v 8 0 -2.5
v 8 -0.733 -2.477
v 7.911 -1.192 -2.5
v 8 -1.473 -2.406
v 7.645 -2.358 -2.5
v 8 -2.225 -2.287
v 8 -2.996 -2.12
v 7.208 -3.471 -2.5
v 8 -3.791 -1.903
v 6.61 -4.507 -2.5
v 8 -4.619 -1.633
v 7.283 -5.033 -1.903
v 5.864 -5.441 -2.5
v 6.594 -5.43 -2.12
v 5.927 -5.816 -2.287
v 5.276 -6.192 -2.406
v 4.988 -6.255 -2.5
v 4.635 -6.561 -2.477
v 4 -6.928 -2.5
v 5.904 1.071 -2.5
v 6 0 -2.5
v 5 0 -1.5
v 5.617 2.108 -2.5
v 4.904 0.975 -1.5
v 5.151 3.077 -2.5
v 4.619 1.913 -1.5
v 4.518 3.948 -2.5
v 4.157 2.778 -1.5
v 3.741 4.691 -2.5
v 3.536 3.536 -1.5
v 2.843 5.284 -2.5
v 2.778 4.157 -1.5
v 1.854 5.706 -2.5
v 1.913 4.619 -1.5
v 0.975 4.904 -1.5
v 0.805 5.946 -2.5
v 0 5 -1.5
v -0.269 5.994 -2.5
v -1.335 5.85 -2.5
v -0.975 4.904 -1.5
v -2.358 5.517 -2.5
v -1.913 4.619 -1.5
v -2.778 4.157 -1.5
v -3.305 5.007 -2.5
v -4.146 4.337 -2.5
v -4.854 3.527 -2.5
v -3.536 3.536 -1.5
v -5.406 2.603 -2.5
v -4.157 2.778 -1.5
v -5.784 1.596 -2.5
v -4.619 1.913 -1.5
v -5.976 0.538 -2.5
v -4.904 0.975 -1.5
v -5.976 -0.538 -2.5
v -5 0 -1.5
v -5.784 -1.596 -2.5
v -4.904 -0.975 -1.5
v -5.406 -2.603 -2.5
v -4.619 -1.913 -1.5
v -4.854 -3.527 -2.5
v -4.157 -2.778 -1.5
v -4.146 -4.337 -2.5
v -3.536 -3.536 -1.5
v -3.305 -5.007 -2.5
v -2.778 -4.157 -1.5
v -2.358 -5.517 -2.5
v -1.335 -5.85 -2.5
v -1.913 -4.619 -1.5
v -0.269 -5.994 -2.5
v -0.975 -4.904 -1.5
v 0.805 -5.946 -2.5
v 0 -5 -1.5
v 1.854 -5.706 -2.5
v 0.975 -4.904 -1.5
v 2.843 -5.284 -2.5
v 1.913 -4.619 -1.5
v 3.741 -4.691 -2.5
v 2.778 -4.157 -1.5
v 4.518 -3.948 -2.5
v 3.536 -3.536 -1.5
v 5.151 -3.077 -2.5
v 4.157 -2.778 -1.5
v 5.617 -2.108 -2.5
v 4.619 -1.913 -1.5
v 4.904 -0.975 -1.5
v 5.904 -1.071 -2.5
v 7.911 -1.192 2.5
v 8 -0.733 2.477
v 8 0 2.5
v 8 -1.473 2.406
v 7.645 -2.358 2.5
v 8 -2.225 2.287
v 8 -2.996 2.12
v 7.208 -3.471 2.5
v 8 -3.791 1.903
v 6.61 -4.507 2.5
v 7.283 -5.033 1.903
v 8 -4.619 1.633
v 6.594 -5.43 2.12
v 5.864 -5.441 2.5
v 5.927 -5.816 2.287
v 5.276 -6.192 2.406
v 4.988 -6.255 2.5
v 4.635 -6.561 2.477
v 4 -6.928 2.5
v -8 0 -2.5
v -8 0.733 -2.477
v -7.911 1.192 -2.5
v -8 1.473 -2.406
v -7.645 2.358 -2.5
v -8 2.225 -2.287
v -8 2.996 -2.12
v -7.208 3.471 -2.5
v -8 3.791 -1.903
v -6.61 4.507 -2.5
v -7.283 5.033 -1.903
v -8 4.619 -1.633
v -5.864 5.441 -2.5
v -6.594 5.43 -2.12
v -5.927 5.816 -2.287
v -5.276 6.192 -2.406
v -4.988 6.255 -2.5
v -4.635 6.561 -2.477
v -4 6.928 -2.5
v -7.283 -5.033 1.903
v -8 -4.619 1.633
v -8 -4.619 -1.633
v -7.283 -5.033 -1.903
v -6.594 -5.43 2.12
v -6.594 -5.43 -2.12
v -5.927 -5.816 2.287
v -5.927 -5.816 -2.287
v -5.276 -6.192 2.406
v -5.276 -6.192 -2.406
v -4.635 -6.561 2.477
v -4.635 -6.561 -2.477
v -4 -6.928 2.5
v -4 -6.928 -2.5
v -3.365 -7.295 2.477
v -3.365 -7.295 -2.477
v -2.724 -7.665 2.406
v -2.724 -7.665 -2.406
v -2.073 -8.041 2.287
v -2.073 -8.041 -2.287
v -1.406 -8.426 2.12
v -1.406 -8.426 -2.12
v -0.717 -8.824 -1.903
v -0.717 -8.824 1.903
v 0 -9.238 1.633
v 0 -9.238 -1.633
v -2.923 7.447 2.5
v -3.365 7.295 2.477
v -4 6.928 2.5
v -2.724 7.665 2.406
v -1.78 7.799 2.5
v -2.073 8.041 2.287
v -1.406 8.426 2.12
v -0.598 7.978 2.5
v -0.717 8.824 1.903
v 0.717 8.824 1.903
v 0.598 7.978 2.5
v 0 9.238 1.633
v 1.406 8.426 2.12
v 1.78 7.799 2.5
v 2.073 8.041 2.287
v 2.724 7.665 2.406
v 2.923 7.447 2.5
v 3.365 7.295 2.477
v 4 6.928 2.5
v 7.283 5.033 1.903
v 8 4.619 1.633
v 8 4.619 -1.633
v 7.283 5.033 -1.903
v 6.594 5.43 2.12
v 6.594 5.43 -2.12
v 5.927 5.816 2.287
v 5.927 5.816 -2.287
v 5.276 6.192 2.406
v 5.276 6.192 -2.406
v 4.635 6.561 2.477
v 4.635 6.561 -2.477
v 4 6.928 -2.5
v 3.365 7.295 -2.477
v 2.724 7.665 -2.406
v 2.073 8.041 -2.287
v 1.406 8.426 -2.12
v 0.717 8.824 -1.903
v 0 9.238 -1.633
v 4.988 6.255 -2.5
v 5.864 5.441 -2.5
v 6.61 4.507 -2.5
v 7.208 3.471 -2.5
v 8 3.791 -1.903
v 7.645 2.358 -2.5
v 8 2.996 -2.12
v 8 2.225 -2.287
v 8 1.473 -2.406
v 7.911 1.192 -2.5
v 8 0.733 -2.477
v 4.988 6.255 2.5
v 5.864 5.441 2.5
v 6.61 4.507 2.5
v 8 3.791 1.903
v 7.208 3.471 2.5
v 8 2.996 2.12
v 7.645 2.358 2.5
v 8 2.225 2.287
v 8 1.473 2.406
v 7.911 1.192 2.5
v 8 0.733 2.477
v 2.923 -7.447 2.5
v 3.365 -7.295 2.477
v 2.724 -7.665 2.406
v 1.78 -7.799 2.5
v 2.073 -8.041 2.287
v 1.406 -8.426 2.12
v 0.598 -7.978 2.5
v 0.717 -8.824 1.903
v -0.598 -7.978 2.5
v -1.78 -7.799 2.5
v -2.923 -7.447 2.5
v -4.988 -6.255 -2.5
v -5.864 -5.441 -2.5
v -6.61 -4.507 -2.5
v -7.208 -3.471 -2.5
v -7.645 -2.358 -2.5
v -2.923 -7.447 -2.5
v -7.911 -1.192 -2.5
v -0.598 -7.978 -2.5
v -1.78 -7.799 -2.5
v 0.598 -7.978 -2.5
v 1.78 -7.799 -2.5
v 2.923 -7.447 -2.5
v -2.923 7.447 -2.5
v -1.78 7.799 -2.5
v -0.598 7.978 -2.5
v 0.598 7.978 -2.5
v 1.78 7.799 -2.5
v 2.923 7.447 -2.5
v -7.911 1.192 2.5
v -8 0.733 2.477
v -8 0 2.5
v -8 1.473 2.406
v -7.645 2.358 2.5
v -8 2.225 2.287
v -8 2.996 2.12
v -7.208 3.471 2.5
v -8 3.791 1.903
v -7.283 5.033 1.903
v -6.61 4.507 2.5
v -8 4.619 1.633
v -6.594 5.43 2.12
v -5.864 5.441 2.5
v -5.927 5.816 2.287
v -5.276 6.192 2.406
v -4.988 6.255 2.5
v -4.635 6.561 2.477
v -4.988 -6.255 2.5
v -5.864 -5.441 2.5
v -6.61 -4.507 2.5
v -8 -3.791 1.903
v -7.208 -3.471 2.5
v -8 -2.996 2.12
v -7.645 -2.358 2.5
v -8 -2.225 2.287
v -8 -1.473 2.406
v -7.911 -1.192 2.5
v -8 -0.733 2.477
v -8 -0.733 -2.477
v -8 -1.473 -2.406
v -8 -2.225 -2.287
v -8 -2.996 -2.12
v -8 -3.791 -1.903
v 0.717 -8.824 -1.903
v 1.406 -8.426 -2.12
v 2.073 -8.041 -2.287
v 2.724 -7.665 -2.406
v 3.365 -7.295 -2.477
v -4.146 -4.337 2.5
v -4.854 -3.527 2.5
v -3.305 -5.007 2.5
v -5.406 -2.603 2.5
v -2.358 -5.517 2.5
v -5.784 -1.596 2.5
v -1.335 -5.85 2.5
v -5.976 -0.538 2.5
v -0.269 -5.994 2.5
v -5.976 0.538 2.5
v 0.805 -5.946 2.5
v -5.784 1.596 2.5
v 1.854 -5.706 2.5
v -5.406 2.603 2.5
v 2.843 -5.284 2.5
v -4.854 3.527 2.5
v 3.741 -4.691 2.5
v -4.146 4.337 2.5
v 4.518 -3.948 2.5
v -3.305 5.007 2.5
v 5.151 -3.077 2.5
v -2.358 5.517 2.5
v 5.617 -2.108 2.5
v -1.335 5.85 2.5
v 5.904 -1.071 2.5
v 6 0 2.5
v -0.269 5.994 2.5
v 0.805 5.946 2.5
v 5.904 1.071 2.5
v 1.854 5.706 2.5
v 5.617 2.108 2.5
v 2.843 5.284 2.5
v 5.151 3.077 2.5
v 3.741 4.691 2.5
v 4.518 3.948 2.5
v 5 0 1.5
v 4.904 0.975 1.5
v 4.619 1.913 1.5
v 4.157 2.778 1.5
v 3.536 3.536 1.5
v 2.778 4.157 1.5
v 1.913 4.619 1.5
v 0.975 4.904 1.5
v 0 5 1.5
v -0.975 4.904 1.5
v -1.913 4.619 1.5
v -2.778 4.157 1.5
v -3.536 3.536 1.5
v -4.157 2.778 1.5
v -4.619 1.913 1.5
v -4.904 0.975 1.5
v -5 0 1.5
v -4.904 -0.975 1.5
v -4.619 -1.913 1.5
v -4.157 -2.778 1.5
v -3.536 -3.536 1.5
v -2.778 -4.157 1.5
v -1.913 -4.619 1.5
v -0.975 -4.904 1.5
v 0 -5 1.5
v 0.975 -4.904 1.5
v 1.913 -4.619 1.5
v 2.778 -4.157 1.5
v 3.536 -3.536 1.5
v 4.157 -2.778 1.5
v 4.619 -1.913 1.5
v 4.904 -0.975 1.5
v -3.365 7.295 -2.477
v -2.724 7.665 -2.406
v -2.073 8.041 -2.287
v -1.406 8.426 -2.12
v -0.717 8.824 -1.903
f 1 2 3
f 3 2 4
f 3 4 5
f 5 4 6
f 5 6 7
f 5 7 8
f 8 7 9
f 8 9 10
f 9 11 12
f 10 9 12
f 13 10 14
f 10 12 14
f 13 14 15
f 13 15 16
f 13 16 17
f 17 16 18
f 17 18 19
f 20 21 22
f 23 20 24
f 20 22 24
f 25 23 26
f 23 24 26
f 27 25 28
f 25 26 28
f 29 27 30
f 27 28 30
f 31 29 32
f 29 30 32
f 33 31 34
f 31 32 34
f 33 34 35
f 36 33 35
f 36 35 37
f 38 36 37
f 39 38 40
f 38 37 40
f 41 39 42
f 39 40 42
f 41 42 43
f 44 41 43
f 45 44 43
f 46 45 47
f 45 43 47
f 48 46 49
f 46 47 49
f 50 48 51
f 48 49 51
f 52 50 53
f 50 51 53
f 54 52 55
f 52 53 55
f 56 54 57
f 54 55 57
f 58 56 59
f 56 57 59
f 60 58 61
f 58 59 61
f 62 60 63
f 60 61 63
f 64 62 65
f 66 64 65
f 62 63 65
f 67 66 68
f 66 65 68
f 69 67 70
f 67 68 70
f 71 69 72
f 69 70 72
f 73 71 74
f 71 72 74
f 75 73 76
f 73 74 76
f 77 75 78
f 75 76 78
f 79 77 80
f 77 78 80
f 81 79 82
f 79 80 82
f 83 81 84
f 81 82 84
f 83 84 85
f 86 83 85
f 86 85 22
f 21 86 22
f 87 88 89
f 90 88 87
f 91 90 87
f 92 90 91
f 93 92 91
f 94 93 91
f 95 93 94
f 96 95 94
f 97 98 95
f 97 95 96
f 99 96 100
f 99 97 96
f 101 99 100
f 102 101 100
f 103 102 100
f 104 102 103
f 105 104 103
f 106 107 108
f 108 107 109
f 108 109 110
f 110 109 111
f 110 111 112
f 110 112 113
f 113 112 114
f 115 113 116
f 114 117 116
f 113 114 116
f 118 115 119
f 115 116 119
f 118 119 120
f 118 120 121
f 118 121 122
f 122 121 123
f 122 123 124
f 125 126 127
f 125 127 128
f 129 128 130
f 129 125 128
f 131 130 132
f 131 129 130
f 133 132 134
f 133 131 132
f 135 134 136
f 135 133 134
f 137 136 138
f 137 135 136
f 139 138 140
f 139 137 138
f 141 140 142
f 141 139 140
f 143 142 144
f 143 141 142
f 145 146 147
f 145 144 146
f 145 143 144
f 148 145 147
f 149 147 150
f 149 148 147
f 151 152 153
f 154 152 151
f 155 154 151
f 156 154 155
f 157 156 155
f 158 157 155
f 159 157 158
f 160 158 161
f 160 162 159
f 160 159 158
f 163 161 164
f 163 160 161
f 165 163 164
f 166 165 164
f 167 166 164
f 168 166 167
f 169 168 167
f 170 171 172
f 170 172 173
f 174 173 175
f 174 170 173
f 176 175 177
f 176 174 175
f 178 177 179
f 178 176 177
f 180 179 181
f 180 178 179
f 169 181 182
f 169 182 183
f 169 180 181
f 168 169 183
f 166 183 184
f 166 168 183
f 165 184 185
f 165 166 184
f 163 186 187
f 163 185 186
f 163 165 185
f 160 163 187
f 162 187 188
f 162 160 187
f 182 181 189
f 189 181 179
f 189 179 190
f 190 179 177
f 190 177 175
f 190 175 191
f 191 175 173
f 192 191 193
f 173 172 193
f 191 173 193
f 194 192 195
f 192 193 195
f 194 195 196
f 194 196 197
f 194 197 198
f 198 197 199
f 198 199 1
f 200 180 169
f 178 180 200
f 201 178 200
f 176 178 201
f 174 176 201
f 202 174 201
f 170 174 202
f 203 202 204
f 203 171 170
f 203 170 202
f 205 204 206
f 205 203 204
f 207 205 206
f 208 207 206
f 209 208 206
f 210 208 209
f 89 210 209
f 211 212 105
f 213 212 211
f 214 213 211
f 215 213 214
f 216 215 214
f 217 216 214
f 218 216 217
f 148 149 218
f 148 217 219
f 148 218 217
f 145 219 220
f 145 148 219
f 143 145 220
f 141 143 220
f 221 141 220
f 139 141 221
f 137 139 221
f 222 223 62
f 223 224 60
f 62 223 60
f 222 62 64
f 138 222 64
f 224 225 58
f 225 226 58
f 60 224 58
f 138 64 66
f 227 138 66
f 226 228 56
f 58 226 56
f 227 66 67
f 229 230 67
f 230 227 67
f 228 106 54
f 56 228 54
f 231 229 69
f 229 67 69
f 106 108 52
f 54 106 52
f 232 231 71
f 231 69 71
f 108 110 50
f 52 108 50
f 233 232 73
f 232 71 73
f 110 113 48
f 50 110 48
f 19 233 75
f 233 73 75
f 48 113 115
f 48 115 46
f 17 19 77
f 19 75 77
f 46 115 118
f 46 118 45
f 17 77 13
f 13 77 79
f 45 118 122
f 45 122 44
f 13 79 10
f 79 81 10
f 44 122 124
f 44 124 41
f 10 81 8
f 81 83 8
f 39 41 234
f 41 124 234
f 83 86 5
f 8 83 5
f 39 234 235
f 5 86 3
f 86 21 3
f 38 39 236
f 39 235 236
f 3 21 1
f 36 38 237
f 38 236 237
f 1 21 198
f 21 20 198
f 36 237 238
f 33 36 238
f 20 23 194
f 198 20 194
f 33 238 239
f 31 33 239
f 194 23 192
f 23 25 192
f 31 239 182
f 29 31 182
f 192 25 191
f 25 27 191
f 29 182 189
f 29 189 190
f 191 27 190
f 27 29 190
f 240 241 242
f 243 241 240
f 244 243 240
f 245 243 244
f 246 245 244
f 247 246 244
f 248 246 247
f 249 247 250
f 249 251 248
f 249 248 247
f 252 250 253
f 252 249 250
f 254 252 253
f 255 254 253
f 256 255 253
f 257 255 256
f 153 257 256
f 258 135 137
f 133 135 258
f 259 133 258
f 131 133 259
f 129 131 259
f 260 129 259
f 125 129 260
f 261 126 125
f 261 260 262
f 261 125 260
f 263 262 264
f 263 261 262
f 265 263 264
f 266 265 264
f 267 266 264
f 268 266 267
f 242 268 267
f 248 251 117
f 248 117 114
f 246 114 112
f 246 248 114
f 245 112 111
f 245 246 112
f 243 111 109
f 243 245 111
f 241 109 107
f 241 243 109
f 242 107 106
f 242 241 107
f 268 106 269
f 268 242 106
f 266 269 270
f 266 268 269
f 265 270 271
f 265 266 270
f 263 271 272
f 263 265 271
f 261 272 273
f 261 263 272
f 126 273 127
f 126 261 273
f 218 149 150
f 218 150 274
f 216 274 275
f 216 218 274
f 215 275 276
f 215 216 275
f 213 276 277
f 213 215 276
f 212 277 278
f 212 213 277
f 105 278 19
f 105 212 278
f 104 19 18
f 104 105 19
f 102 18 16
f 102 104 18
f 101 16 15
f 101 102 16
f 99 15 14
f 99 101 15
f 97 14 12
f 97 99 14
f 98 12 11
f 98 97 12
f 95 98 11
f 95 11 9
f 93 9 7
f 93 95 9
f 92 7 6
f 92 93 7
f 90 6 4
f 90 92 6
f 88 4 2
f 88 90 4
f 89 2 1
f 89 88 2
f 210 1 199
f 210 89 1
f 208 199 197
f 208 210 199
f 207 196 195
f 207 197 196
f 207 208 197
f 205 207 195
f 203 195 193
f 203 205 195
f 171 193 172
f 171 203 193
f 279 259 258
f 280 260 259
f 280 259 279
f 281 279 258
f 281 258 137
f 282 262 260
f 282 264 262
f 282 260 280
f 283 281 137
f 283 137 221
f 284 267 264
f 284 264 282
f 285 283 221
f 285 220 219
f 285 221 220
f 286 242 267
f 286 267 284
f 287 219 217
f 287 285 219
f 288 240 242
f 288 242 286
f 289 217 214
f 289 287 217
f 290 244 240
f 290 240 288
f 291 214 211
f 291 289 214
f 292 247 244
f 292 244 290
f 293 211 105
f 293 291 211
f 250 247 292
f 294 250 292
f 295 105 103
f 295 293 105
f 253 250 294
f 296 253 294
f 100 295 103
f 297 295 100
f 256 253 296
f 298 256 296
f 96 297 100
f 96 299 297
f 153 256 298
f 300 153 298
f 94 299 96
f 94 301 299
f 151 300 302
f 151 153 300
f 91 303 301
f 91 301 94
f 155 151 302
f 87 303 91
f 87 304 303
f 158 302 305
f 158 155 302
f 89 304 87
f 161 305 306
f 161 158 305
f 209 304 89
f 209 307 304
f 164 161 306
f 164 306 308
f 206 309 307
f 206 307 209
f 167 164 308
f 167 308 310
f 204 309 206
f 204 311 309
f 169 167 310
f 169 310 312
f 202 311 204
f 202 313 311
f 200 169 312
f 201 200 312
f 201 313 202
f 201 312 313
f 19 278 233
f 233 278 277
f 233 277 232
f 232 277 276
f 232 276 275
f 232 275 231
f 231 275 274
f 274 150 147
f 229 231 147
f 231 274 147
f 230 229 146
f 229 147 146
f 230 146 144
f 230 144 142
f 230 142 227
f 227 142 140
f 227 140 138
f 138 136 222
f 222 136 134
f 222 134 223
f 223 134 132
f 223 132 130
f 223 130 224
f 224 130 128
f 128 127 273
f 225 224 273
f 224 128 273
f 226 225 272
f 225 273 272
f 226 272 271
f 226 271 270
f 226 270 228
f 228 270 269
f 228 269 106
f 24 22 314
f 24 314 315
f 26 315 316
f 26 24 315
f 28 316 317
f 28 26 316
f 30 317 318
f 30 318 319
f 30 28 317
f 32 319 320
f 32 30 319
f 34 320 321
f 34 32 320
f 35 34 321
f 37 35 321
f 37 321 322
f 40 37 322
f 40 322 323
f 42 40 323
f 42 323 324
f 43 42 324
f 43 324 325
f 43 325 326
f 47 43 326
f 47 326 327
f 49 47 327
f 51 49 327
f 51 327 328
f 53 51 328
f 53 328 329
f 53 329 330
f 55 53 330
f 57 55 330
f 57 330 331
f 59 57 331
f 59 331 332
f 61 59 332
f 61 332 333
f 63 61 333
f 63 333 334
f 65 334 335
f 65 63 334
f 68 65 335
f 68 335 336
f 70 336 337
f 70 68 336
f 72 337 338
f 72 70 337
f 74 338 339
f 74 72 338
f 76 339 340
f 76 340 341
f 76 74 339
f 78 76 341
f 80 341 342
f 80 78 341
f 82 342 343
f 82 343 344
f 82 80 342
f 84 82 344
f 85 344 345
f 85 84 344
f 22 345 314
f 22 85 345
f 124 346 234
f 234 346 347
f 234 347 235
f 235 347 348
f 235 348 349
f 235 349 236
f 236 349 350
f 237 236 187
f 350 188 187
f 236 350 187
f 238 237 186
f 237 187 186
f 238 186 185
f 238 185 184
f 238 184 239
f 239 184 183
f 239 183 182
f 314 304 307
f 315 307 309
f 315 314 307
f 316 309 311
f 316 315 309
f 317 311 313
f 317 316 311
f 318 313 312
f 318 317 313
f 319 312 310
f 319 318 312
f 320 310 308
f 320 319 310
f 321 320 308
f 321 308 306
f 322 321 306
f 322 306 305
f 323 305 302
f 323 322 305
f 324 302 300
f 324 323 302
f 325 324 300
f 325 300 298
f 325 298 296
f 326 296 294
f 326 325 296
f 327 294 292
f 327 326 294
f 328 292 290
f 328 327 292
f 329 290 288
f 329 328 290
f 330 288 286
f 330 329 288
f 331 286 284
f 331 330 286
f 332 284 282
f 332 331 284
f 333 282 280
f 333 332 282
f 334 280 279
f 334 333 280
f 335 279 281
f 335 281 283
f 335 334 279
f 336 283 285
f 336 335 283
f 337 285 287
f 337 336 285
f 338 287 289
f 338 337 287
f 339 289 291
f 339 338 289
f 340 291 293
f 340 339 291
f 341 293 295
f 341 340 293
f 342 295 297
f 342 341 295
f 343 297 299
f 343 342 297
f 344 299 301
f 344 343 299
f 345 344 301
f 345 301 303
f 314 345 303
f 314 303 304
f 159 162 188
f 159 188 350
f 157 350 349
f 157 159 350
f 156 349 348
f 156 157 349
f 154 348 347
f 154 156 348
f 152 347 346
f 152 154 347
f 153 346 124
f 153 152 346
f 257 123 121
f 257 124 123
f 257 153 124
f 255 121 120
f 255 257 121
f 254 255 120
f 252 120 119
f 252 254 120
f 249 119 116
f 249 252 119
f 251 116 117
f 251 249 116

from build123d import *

# Parameters (mm, degrees)
SKETCH1_R           = 5
BOSS_EXTRUDE1_DEPTH = 2.5
SKETCH2_OUTSIDE_W   = 40.128
SKETCH2_OUTSIDE_H   = 42.604
SKETCH2_OUTSIDE_R   = 8
CUT_EXTRUDE1_DEPTH  = 6
CUT_EXTRUDE1_TAPER  = 55
CHAMFER1_SIZE       = 1


with BuildPart() as part:
    # Sketch1 → Boss-Extrude1 (new body, symmetric)
    with BuildSketch(Plane.XY):
        Polygon((-8, 4.618802154), (-8, -4.618802154), (0, -9.237604307), (8, -4.618802154), (8, 4.618802154), (0, 9.237604307), align=None)
        Circle(SKETCH1_R, mode=Mode.SUBTRACT)
    extrude(amount=BOSS_EXTRUDE1_DEPTH, both=True)

    # Sketch2 outside → Cut-Extrude1 (cut, through all)
    with BuildSketch(Plane.XY.offset(2.5)):
        Rectangle(SKETCH2_OUTSIDE_W, SKETCH2_OUTSIDE_H)
        Circle(SKETCH2_OUTSIDE_R, mode=Mode.SUBTRACT)
    cut_extrude1 = extrude(amount=-CUT_EXTRUDE1_DEPTH, taper=CUT_EXTRUDE1_TAPER, mode=Mode.SUBTRACT)

    # Mirror1: Cut-Extrude1 across plane
    add(cut_extrude1.mirror(Plane.XY), mode=Mode.SUBTRACT)

    # Chamfer1
    chamfer1_edges = [part.edges().sort_by_distance(p)[0] for p in [
        (-5, 0, -2.5),
        (-5, 0, 2.5),
    ]]
    chamfer(chamfer1_edges, length=CHAMFER1_SIZE)


solid = part.part
